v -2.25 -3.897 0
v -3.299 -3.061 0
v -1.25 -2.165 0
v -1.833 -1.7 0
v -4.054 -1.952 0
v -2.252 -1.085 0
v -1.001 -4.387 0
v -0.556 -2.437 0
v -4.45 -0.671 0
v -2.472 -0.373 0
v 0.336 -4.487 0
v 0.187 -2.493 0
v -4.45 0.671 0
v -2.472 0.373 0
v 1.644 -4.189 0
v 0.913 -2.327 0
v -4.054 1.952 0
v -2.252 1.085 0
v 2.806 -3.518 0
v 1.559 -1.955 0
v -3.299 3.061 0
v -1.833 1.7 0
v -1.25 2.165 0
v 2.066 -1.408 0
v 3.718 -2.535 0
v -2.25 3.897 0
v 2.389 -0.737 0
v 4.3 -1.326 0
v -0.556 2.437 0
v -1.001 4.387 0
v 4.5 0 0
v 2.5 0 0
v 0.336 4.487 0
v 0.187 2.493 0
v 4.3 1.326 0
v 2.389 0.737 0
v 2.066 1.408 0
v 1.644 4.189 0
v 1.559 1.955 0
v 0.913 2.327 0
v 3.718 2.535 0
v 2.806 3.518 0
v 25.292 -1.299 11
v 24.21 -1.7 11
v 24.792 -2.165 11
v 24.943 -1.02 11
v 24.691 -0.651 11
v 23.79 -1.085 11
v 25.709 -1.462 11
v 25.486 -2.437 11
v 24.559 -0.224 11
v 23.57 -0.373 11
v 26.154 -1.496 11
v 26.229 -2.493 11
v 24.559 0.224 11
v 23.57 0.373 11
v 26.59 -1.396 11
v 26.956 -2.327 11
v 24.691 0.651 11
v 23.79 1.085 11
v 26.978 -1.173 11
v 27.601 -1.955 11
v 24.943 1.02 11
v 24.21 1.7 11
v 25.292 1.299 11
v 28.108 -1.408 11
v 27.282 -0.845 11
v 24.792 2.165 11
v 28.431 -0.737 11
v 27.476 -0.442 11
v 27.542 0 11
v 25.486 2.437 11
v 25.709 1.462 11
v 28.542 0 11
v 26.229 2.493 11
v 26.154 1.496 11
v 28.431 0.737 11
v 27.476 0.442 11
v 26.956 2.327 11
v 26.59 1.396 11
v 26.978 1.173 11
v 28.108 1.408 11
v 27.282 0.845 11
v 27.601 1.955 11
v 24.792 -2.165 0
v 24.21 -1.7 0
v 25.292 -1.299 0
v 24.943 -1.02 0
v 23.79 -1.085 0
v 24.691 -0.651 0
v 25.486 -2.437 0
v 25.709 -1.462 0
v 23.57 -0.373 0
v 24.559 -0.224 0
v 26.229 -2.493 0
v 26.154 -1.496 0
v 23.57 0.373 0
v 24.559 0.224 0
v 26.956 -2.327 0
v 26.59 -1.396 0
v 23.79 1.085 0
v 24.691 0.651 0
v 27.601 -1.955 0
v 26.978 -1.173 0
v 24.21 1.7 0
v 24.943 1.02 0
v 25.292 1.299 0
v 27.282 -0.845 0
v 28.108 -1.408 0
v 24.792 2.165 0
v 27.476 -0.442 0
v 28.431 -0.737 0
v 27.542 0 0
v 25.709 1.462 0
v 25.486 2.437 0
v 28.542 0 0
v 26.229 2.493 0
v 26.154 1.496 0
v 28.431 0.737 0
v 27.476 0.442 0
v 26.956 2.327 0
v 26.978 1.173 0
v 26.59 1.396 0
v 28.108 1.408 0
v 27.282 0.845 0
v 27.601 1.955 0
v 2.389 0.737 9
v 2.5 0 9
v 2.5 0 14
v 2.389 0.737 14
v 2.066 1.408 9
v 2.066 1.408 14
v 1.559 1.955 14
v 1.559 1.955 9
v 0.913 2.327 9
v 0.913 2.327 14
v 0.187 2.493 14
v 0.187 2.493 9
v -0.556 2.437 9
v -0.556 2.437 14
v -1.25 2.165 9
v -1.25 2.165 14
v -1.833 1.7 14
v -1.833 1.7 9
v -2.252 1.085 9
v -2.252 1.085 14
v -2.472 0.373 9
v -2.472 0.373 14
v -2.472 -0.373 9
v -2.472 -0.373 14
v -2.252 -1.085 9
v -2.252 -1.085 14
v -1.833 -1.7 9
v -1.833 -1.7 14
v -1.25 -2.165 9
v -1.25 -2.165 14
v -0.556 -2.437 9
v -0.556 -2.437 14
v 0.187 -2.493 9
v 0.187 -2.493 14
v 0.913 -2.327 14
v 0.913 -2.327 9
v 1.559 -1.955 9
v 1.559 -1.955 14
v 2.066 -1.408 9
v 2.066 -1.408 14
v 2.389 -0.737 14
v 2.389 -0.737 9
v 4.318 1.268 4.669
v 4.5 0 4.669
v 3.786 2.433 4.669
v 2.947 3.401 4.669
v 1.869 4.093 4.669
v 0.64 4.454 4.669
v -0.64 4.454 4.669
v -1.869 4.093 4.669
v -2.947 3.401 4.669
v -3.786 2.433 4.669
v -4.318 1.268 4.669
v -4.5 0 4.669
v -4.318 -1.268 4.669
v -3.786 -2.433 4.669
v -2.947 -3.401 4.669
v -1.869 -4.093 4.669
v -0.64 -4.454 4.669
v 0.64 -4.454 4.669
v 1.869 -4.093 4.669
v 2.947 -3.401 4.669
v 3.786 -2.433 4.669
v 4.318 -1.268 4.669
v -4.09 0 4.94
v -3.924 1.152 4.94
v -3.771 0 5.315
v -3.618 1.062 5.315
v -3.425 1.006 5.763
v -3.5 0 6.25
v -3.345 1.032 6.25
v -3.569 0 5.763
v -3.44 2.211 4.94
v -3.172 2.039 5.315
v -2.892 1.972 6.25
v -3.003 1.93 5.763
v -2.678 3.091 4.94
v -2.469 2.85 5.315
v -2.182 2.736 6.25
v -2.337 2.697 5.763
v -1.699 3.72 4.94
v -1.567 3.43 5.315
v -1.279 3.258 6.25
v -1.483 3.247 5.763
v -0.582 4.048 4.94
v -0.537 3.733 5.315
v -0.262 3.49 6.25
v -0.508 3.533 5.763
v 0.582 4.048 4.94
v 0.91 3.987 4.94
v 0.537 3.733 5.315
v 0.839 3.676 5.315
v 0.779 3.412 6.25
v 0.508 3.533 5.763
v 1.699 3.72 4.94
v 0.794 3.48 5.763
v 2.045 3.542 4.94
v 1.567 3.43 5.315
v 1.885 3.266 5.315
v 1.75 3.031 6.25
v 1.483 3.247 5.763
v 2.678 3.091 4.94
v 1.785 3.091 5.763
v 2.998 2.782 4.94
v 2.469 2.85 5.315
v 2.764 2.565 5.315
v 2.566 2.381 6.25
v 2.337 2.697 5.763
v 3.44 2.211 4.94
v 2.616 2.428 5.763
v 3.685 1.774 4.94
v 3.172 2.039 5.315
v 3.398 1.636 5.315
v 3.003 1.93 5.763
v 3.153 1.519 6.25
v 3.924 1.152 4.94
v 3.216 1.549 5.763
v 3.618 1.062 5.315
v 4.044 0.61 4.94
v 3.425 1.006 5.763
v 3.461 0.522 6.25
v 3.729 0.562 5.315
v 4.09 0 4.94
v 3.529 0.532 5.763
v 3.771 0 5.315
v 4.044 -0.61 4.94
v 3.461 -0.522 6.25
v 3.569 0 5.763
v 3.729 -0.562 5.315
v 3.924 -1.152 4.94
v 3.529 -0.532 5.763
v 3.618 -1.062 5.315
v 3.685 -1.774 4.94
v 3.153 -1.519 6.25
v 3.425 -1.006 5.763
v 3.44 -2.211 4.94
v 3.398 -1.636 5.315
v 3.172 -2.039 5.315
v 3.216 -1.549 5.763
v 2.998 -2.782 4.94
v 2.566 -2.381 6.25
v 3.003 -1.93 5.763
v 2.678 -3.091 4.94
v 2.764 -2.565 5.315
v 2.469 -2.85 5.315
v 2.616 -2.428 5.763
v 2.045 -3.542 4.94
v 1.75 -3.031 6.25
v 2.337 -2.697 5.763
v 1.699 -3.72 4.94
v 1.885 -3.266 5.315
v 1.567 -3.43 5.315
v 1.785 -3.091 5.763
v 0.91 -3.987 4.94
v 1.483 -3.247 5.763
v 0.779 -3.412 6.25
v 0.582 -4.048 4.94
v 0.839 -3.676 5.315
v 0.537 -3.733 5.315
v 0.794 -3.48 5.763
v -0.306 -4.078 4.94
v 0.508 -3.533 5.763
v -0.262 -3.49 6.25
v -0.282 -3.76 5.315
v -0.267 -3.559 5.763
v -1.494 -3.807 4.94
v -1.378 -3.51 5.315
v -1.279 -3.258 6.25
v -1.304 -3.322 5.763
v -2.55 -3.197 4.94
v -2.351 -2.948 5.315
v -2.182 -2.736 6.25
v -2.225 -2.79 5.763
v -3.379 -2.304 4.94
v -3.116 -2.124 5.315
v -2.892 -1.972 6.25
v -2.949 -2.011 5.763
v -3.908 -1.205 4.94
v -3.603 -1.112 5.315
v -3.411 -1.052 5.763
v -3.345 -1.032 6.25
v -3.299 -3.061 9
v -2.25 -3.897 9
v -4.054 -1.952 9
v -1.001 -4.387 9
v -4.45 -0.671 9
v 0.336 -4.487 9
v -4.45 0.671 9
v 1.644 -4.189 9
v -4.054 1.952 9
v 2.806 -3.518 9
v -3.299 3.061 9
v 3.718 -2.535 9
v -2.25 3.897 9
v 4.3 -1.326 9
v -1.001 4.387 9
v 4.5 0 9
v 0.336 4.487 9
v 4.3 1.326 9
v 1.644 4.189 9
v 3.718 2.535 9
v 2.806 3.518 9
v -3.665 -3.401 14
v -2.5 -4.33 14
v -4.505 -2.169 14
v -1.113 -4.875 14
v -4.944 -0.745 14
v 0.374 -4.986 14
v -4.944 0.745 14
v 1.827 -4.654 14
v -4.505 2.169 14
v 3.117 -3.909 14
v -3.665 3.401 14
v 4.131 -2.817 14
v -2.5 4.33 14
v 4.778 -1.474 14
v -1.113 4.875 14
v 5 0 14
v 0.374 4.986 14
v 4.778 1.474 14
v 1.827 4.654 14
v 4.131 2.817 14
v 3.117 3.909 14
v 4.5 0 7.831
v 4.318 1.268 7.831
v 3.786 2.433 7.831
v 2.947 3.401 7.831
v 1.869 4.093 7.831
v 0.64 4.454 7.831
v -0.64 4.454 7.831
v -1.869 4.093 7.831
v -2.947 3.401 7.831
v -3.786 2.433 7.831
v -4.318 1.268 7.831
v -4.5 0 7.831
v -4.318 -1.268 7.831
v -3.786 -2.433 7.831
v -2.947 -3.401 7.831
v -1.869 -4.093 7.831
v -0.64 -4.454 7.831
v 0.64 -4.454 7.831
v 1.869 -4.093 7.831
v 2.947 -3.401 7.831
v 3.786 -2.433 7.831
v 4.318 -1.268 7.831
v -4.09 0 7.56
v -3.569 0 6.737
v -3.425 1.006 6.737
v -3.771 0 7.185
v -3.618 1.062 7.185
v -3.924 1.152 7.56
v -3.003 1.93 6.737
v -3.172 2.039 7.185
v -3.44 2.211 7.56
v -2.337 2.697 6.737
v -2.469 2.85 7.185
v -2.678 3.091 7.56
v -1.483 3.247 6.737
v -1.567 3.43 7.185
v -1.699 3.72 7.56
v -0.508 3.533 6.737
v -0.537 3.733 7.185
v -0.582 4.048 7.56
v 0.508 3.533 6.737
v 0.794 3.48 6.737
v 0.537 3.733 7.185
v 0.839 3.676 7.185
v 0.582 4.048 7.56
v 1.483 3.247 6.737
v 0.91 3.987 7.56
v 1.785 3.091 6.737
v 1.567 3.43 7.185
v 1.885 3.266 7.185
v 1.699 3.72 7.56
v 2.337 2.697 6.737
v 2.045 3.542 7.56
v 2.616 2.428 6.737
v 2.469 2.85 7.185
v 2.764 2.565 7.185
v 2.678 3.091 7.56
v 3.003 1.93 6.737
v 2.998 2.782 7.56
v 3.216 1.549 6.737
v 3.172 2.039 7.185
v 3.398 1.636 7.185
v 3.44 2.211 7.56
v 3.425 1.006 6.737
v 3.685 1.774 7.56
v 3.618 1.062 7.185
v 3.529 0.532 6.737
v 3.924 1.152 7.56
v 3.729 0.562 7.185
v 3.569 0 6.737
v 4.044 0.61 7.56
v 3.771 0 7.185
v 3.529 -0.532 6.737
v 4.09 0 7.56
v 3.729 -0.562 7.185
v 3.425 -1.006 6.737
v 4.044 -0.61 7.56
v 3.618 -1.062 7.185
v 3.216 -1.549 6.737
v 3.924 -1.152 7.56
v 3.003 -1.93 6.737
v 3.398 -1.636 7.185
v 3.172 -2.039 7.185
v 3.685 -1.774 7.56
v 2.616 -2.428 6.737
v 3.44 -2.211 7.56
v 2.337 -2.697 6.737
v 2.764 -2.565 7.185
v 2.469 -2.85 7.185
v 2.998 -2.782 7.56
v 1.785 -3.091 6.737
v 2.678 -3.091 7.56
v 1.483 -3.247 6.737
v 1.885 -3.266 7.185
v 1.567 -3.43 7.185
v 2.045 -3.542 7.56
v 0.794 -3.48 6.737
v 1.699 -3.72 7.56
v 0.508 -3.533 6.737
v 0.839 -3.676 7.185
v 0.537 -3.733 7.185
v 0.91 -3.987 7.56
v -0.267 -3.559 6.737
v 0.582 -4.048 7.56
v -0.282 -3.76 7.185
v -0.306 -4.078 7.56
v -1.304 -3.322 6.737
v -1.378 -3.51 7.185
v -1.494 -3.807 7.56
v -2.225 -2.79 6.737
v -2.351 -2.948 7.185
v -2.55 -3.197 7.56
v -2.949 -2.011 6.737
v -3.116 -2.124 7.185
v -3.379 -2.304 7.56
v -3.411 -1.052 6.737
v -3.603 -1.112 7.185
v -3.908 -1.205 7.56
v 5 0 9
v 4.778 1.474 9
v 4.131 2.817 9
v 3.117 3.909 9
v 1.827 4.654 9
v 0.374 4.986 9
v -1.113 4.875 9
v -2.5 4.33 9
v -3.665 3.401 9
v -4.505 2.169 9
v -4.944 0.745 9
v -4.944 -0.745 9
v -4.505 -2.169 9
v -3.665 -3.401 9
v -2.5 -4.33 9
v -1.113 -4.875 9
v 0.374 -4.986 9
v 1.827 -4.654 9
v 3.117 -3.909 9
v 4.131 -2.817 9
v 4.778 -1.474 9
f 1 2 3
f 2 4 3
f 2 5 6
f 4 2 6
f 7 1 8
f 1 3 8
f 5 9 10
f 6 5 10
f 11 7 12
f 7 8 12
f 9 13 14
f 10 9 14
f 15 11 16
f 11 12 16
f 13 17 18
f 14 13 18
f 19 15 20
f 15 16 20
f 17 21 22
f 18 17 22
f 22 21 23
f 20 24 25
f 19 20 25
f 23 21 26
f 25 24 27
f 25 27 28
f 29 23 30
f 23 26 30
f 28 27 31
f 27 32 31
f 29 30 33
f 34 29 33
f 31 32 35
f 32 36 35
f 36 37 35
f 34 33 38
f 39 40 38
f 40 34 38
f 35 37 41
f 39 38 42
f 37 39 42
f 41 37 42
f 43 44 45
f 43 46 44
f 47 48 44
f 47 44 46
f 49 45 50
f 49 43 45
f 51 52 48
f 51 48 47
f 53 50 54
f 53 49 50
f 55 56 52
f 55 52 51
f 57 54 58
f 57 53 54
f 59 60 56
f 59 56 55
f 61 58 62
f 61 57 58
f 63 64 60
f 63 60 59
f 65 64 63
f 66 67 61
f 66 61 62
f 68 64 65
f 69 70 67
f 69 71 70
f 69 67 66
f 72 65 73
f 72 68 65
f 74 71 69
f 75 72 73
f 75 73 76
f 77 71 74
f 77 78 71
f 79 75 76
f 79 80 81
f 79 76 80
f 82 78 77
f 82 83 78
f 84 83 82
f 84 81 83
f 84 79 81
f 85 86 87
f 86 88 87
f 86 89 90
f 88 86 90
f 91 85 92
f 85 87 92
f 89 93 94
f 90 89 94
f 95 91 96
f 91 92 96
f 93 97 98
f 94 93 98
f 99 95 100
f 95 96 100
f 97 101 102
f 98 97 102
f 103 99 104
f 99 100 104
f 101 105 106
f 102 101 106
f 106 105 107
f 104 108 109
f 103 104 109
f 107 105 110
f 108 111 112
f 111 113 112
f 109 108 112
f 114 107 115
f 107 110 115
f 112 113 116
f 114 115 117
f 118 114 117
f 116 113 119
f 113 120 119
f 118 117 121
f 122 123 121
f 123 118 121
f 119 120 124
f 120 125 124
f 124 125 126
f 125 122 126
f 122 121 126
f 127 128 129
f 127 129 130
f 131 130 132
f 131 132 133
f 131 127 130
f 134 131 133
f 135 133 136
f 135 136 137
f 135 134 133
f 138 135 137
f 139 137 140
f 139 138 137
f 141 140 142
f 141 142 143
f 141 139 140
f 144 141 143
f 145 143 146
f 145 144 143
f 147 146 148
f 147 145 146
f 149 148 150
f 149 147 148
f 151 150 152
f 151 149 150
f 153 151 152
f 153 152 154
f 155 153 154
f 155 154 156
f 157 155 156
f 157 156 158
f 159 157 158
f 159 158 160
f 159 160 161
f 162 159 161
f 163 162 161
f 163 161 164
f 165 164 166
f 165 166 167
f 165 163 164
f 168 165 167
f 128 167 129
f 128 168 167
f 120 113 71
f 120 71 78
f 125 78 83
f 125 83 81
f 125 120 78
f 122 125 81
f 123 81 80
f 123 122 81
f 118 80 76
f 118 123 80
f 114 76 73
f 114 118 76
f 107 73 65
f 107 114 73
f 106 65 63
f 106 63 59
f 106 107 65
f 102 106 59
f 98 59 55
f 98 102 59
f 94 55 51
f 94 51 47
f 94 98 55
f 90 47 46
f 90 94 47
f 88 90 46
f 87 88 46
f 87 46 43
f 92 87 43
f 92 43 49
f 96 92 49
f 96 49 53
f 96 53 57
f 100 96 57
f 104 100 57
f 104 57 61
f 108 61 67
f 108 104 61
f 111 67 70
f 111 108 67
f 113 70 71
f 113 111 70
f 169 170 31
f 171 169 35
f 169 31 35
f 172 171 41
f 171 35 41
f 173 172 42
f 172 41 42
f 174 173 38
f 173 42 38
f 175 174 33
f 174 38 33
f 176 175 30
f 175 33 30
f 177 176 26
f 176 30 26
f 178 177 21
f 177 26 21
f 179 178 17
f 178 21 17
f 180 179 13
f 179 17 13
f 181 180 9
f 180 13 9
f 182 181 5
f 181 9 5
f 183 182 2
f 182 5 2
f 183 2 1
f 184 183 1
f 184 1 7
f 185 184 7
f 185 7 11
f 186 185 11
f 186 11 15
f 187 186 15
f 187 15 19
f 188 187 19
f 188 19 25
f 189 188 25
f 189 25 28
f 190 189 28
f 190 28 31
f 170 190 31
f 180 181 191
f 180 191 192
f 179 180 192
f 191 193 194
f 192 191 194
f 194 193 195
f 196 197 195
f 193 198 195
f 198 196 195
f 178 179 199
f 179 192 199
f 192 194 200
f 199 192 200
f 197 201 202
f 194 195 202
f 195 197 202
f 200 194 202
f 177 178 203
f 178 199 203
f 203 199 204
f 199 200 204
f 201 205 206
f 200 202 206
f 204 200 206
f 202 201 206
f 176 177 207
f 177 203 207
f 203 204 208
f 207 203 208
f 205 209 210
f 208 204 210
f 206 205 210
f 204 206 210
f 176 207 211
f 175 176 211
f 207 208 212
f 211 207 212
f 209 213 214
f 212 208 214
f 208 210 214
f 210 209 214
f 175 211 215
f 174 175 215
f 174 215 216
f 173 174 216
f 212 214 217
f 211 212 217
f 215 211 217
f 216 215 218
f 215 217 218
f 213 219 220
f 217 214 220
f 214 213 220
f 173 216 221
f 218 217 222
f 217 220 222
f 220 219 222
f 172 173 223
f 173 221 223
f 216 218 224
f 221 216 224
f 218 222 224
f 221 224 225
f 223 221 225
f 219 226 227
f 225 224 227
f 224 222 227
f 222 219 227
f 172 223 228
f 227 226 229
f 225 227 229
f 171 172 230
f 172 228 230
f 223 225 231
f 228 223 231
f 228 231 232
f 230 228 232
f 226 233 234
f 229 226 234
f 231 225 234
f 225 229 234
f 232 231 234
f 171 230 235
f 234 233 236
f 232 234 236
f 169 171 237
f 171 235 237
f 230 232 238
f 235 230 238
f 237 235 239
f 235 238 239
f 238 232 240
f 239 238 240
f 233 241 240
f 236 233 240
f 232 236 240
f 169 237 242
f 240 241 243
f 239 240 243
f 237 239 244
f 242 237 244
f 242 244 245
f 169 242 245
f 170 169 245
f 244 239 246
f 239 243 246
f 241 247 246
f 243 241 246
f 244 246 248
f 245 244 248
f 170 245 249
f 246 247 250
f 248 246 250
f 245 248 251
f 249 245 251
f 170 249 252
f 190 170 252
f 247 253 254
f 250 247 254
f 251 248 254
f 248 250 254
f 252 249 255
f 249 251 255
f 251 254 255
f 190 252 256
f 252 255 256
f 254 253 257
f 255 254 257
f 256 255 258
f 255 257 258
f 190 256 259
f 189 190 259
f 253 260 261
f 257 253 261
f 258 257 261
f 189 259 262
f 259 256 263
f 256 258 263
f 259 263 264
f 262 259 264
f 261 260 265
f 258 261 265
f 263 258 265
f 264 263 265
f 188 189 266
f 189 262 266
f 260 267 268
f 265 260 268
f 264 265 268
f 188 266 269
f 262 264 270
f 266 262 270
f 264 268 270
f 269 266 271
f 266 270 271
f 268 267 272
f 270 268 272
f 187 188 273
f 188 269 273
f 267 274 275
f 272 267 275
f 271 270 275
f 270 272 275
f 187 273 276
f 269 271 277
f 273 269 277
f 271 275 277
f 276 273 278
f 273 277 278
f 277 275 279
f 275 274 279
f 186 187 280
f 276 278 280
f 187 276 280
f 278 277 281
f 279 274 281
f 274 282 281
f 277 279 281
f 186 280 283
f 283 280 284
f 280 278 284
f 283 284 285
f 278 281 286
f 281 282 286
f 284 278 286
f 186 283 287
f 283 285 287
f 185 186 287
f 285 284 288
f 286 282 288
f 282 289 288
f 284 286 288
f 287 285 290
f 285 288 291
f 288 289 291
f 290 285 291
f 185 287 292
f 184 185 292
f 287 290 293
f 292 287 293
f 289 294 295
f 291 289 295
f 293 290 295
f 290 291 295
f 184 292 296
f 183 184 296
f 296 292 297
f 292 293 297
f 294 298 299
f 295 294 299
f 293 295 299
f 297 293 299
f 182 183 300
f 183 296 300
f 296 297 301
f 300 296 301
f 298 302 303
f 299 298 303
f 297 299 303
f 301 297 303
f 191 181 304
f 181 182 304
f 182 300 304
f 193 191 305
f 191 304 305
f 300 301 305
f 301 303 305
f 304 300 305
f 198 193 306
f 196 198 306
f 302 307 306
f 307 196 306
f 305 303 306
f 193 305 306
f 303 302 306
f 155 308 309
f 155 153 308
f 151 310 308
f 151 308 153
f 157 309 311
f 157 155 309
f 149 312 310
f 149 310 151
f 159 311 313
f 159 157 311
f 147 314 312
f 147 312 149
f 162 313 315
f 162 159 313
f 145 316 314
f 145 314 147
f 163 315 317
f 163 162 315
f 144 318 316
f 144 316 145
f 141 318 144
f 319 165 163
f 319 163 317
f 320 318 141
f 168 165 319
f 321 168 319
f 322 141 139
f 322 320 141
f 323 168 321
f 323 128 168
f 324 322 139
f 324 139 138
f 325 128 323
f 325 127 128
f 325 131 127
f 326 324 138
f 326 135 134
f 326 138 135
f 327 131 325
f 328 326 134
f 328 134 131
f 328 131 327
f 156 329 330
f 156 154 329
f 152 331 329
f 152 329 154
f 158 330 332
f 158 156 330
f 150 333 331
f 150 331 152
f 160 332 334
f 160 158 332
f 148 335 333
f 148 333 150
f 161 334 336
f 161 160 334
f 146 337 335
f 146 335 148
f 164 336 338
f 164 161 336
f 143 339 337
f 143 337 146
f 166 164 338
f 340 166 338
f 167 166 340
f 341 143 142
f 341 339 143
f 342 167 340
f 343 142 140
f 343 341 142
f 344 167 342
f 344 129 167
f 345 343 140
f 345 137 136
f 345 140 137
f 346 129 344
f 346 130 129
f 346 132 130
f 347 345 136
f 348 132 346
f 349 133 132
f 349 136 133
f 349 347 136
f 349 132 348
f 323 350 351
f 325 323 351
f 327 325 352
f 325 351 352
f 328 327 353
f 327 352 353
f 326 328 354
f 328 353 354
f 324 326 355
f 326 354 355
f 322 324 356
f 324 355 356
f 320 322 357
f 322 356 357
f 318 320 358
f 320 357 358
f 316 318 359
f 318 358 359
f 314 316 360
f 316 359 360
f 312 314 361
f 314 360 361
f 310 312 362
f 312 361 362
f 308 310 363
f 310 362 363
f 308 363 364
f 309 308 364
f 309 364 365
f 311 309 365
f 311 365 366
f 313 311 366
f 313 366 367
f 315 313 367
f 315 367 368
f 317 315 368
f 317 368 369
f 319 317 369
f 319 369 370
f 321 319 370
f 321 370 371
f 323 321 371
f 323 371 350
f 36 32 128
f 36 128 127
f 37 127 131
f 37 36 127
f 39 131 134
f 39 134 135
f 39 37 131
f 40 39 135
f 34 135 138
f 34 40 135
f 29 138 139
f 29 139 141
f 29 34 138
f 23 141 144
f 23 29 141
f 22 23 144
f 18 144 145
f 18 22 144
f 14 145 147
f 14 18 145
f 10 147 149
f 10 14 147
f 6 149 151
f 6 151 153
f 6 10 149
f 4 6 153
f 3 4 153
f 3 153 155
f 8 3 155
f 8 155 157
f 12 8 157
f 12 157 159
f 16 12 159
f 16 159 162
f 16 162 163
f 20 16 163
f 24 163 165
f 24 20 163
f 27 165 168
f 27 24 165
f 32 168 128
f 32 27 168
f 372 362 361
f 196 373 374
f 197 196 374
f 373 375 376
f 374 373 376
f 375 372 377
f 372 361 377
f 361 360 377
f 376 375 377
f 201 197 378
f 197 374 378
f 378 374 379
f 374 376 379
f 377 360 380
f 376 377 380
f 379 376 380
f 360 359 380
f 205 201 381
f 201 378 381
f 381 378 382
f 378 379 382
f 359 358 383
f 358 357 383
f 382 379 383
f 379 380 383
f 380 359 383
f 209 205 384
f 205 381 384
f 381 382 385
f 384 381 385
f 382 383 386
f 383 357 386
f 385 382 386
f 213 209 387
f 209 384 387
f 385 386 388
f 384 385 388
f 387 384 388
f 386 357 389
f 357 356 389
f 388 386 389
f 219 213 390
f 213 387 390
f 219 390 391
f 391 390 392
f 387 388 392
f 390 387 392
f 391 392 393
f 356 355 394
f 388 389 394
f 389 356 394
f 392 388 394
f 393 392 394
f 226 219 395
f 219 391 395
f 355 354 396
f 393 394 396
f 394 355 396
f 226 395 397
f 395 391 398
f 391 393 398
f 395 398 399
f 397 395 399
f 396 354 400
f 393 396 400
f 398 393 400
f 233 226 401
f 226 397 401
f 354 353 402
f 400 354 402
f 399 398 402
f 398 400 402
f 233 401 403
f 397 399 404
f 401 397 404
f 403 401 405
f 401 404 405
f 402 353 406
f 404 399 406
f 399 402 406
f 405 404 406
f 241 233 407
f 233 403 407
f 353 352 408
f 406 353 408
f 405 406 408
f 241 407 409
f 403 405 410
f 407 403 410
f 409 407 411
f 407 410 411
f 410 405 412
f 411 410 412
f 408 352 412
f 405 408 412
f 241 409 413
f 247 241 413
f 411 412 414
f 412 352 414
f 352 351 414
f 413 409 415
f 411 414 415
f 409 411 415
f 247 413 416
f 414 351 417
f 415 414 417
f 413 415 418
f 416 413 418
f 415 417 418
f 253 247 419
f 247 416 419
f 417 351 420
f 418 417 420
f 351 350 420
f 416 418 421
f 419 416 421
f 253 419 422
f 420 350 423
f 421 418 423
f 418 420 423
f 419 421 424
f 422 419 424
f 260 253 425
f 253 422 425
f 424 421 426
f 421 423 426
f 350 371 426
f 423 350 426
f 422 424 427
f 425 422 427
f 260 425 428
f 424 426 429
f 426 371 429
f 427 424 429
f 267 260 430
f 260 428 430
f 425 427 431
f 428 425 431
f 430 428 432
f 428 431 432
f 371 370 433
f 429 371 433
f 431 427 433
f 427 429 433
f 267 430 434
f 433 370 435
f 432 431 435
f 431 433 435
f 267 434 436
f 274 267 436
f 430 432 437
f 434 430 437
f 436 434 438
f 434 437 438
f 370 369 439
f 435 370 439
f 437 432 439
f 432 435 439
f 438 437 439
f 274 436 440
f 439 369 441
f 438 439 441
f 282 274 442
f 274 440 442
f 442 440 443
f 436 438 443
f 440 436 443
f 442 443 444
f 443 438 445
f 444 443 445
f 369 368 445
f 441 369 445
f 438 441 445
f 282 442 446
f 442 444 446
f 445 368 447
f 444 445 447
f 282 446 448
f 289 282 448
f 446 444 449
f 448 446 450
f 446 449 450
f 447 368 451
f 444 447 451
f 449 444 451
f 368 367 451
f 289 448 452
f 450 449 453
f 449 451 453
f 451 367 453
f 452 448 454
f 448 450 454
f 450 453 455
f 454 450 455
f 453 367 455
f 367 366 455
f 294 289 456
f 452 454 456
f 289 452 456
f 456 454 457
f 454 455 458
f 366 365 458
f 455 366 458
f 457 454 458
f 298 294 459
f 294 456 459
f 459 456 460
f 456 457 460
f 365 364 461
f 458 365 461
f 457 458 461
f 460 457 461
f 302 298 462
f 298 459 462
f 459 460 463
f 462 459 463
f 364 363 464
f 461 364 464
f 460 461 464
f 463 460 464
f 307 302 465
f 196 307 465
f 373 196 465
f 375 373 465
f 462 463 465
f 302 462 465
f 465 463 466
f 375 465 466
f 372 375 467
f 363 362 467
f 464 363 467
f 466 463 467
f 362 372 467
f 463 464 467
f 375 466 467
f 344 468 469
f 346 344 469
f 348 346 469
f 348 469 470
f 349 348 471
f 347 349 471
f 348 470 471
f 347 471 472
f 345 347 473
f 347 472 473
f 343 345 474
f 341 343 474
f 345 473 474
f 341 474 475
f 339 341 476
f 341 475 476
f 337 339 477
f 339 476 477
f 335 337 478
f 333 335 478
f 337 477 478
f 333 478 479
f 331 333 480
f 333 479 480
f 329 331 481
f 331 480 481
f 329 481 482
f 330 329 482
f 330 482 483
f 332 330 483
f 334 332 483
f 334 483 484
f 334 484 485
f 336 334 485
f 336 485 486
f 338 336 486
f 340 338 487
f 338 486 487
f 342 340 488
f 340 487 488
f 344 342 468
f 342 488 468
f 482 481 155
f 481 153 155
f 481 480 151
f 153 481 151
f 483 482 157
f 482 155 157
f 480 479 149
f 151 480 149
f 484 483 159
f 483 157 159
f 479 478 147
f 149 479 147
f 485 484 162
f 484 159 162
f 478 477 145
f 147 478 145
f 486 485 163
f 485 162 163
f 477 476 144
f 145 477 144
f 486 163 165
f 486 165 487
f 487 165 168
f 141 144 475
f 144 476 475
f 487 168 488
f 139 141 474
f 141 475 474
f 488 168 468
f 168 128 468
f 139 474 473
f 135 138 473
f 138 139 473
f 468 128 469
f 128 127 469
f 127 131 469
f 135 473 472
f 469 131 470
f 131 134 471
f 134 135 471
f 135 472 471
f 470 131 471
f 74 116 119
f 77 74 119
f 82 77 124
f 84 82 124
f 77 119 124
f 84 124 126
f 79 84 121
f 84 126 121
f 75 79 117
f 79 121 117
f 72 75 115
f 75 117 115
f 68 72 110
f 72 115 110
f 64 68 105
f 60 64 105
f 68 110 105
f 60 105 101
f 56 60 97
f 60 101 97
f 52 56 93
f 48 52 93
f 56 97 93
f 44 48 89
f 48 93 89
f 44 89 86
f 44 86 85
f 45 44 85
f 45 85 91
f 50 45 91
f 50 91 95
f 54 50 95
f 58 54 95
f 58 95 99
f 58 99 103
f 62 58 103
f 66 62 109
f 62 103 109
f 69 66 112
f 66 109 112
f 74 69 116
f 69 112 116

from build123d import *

# Parameters (mm, degrees)
F1_R     = 4.5
F1_R_2   = 2.5
F2_DEPTH = 9
F3_R     = 1.75
F5_R     = 5
F5_R_2   = 4.5
F5_R_3   = 2.5
F6_DEPTH = 5
F7_R     = 2.5
F7_R_2   = 1.5
F8_DEPTH = 11


with BuildPart() as f2:
    # F1 (on Top) → F2 (new body)
    with BuildSketch(Plane.XY):
        Circle(F1_R)
        Circle(F1_R_2, mode=Mode.SUBTRACT)
    extrude(amount=F2_DEPTH)

    # F3 (on Front) → F4 (revolve, cut)
    with BuildSketch(Plane.XZ):
        with Locations((-5.25, 6.25)):
            Circle(F3_R)
    revolve(axis=Axis((0, 0, 0), (0, 0, -1)), mode=Mode.SUBTRACT)


with BuildPart() as f6:
    # F5 (on face) → F6 (new body)
    with BuildSketch(Plane.XY.offset(9)):
        Circle(F5_R)
        Circle(F5_R_2, mode=Mode.SUBTRACT)
        Circle(F5_R_2)
        Circle(F5_R_3, mode=Mode.SUBTRACT)
    extrude(amount=F6_DEPTH)


with BuildPart() as f8:
    # F7 (on Top) → F8 (new body)
    with BuildSketch(Plane.XY):
        with Locations((26.0423235595, 0)):
            Circle(F7_R)
        with Locations((26.0423235595, 0)):
            Circle(F7_R_2, mode=Mode.SUBTRACT)
    extrude(amount=F8_DEPTH)


solid = Compound([f2.part, f6.part, f8.part])
